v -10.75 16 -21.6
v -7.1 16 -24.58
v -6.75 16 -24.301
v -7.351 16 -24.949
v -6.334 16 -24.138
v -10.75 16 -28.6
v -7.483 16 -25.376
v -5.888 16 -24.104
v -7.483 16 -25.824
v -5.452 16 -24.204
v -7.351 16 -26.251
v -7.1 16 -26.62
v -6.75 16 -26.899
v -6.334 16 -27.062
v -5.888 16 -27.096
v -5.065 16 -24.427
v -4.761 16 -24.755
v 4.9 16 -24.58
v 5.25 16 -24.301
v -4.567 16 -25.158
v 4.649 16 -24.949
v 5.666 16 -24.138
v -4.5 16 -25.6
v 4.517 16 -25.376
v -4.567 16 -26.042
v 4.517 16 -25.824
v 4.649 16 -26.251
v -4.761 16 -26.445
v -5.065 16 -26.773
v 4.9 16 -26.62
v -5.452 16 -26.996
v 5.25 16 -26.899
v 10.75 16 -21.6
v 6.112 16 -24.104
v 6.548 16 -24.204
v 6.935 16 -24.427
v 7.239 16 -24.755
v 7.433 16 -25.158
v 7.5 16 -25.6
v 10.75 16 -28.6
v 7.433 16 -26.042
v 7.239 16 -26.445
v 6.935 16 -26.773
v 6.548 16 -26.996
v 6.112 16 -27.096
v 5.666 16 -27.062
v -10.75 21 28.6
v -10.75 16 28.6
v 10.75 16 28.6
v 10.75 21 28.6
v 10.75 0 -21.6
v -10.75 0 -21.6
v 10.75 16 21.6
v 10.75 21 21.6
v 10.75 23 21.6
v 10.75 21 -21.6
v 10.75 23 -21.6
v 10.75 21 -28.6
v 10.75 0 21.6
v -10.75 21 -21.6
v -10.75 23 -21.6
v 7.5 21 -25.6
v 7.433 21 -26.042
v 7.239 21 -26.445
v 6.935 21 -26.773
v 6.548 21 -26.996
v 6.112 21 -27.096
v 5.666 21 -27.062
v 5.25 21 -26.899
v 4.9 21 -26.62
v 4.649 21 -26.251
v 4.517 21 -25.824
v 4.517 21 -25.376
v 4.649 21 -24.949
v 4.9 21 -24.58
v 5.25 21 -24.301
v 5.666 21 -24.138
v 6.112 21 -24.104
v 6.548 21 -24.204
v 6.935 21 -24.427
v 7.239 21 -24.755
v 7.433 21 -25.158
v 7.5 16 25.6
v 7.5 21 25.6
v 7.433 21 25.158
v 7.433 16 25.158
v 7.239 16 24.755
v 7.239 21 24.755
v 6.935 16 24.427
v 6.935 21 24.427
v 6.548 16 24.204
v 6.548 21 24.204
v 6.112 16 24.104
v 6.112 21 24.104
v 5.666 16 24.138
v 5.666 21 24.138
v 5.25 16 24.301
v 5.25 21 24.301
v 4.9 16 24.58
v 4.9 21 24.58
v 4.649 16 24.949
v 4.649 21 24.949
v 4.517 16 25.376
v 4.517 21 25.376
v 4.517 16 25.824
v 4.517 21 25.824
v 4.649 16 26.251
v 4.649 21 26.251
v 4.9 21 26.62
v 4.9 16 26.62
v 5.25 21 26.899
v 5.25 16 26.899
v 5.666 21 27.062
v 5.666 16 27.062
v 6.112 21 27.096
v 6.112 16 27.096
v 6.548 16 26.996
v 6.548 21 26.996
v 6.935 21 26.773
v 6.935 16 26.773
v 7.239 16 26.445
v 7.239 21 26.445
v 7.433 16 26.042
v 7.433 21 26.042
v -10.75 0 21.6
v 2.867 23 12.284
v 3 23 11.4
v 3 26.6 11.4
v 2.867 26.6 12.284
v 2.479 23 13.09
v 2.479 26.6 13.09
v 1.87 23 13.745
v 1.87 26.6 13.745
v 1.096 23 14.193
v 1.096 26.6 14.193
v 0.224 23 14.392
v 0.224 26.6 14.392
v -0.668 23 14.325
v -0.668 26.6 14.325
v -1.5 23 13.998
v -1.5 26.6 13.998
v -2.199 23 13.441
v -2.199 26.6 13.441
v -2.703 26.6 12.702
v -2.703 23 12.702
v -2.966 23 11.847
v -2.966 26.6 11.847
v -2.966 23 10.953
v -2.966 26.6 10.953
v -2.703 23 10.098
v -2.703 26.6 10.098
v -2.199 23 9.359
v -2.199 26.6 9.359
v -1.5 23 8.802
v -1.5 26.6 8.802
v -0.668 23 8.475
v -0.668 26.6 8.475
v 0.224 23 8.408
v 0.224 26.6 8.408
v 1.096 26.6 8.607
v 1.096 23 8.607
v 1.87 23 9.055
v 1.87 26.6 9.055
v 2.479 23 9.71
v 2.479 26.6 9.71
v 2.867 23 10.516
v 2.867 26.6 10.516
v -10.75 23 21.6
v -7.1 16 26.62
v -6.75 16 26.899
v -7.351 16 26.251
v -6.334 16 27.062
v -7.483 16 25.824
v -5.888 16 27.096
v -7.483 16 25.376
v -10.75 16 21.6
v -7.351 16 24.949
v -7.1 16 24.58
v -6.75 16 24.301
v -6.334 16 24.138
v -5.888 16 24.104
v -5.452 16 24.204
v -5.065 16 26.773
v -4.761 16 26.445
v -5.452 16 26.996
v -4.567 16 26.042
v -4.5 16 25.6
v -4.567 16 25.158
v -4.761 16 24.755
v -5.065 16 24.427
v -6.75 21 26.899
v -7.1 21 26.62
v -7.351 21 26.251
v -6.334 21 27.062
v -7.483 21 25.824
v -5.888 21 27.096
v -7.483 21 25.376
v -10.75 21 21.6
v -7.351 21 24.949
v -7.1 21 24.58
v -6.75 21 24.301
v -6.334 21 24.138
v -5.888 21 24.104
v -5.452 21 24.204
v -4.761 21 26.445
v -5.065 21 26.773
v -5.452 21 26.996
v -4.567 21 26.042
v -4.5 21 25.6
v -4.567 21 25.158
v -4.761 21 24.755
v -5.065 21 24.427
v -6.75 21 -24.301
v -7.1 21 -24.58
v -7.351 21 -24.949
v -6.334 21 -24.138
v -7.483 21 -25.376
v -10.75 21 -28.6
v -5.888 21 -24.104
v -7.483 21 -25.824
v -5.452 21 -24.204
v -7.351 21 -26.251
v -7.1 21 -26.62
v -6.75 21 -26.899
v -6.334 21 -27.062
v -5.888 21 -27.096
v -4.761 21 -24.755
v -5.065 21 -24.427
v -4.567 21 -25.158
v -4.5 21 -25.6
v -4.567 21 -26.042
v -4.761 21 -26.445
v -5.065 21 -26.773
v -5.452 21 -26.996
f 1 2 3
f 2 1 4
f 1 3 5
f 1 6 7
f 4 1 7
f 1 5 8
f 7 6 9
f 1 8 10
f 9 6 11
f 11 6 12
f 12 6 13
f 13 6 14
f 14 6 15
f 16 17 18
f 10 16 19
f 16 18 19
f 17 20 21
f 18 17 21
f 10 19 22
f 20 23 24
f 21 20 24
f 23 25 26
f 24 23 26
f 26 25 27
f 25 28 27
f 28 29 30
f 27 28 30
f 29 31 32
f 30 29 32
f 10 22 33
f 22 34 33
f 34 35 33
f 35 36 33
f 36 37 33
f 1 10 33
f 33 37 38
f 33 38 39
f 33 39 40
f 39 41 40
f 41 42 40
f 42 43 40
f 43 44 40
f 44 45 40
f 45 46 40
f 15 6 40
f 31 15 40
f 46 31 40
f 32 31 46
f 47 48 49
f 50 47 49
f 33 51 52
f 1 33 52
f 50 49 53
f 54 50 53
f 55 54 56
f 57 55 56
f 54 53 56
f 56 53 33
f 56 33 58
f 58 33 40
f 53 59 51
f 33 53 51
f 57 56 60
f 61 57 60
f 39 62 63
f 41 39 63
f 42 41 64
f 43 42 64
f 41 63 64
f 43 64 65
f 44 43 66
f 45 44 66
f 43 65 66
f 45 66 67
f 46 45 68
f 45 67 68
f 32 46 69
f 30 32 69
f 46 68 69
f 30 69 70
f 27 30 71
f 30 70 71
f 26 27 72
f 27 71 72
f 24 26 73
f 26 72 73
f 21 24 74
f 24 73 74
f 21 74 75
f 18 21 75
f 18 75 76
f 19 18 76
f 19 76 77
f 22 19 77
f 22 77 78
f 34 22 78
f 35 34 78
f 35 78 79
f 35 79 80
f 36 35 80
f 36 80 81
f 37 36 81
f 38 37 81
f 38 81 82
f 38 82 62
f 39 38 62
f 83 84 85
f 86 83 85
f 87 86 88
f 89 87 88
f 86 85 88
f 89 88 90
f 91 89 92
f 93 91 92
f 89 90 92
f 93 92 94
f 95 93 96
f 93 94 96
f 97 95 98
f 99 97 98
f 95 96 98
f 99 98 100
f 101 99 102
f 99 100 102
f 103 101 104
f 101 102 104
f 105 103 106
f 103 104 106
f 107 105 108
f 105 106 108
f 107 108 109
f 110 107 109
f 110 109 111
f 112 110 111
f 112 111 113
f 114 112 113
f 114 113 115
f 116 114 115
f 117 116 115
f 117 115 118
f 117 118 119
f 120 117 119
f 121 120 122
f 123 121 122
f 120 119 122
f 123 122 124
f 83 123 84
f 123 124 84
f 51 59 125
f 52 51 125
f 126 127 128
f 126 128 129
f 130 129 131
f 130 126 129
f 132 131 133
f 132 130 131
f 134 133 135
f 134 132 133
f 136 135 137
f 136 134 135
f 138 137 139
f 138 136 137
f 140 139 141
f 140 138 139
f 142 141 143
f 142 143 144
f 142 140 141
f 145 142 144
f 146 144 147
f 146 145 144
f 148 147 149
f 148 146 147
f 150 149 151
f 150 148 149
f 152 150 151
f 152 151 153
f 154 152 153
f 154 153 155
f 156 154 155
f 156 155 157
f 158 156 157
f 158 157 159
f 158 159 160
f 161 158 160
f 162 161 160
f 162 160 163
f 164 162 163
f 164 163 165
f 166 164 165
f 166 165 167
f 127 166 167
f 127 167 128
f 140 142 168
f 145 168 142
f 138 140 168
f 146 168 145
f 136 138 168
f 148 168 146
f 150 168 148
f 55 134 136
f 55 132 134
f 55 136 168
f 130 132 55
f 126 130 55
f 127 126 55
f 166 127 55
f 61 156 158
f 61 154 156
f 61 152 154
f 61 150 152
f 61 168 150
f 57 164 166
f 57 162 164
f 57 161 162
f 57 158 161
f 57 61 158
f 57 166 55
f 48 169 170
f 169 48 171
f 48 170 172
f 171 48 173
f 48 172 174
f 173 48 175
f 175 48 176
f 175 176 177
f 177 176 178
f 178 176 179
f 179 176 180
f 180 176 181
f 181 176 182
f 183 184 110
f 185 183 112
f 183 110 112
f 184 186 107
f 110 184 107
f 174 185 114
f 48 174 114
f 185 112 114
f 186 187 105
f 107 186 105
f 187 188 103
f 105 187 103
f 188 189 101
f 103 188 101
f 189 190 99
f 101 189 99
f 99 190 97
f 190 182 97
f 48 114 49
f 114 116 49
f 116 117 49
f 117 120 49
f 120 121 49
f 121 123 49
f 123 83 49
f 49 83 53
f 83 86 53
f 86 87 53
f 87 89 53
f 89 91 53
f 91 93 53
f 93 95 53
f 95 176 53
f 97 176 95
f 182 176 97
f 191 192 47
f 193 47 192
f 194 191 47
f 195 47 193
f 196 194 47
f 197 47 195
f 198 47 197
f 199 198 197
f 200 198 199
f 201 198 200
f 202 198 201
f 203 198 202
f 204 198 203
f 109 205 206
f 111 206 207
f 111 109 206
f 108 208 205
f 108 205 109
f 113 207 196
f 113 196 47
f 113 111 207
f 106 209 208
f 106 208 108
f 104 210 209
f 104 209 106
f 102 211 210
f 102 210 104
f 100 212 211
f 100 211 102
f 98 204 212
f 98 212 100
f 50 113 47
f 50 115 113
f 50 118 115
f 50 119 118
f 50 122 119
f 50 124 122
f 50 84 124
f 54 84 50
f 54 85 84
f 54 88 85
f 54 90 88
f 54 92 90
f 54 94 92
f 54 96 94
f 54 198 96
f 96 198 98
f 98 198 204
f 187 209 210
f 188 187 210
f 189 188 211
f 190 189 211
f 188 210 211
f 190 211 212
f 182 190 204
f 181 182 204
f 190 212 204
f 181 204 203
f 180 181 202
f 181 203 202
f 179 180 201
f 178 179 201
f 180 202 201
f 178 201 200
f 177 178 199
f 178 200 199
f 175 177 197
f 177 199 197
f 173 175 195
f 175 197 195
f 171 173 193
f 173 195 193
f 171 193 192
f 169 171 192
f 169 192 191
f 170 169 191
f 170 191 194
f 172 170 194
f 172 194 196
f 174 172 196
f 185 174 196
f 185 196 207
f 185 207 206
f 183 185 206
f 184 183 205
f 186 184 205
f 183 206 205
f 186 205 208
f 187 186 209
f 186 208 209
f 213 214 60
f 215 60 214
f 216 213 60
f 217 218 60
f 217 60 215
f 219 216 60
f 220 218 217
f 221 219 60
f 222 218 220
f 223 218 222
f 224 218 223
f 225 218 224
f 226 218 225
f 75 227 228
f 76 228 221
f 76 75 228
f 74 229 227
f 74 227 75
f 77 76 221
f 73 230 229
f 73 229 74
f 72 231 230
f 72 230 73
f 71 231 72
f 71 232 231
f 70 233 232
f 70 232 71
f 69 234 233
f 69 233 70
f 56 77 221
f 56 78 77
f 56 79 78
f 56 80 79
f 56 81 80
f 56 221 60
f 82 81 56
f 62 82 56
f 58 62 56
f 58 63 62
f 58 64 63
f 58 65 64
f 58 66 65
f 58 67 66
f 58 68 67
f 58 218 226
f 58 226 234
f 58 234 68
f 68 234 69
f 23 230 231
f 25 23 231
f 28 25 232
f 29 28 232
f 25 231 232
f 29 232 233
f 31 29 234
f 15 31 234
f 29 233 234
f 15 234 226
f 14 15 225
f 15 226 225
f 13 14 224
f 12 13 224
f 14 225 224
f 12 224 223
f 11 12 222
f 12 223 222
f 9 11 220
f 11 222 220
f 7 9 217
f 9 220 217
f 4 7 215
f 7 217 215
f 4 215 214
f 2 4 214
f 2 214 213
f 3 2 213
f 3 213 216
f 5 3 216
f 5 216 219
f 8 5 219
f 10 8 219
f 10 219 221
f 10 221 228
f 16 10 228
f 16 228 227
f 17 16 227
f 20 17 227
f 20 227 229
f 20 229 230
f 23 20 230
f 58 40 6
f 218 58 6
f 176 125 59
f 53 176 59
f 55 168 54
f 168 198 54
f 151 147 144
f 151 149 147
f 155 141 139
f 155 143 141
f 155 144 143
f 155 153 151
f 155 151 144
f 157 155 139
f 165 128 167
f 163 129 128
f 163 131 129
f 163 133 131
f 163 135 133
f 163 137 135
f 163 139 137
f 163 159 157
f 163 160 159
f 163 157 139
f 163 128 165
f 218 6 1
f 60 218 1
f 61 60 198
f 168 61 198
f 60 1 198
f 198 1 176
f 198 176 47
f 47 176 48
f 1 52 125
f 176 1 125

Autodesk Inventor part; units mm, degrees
ref_plane "YZ Plane" through (0, 0, 0) normal (1, 0, 0) x (0, 1, 0)
ref_plane "XZ Plane" through (0, 0, 0) normal (0, 1, 0) x (-1, 0, 0)
ref_plane "XY Plane" through (0, 0, 0) normal (0, 0, 1) x (1, 0, 0)
sketch "スケッチ1" plane through (0, 0, 0) normal (0, 1, 0) x (-1, 0, 0)
  line L0 (10.75, 21.6) -> (-10.75, 21.6)
  line L1 (-10.75, 21.6) -> (-10.75, -21.6)
  line L2 (-10.75, -21.6) -> (10.75, -21.6)
  line L3 (10.75, -21.6) -> (10.75, 21.6)
  line L4 (0, -30.24) -> (0, 30.24) projected
  line L5 (-15.05, 0) -> (15.05, 0) projected
  point P0 (0, 0)
  dimension "d0" = 21.5
  dimension "d1" = 43.2
extrude "押し出し1" add sketch "スケッチ1" along normal blind 16
sketch "スケッチ2" plane through (0, 16, 0) normal (0, 1, 0) x (1, 0, 0)
  line L0 (-10.75, -28.6) -> (10.75, -28.6)
  line L1 (10.75, -28.6) -> (10.75, 28.6)
  line L2 (10.75, 28.6) -> (-10.75, 28.6)
  line L3 (-10.75, 28.6) -> (-10.75, -28.6)
  line L4 (15.155, 0) -> (-15.155, 0) projected
  point P0 (0, 0)
  point P1 (-10.75, -21.6)
  point P2 (10.75, -21.6)
  dimension "d4" = 57.2
extrude "押し出し2" add sketch "スケッチ2" along normal blind 5
sketch "スケッチ3" plane through (0, 21, 0) normal (0, 1, 0) x (1, 0, 0)
  circle A0 centre (-6, -25.6) radius 1.5
  circle A1 centre (6, -25.6) radius 1.5
  circle A2 centre (-6, 25.6) radius 1.5
  circle A3 centre (6, 25.6) radius 1.5
  line L0 (15.05, 0) -> (-15.05, 0) projected
  line L1 (0, 40.04) -> (0, -40.04) projected
  point P0 (0, 0)
  dimension "d9" = 3
  dimension "d10" = 3
  dimension "d11" = 3
  dimension "d12" = 3
  dimension "d13" = 12
  dimension "d14" = 12
  dimension "d15" = 51.2
  dimension "d16" = 51.2
extrude "押し出し3" cut sketch "スケッチ3" against normal up to next
sketch "スケッチ4" plane through (0, 21, 0) normal (0, 1, 0) x (1, 0, 0)
  line L0 (10.75, 21.6) -> (-10.75, 21.6) projected
  line L1 (-10.75, -21.6) -> (10.75, -21.6) projected
  line L2 (-10.75, 28.6) -> (-10.75, -28.6) projected
  line L3 (10.75, -28.6) -> (10.75, 28.6) projected
  point P0 (0, 0)
extrude "押し出し4" add sketch "スケッチ4" along normal blind 2
sketch "スケッチ5" plane through (0, 23, 0) normal (0, 1, 0) x (1, 0, 0)
  circle A0 centre (0, -11.4) radius 3
  circle A1 centre (6, -25.6) radius 1.5 projected
  line L0 (0, 40.04) -> (0, -40.04) projected
  point P0 (0, 0)
  dimension "d21" = 14.2
  dimension "d22" = 6
extrude "押し出し5" add sketch "スケッチ5" along normal blind 3.6 contours A0 L0 | L0 A0
properties part number "servo"
